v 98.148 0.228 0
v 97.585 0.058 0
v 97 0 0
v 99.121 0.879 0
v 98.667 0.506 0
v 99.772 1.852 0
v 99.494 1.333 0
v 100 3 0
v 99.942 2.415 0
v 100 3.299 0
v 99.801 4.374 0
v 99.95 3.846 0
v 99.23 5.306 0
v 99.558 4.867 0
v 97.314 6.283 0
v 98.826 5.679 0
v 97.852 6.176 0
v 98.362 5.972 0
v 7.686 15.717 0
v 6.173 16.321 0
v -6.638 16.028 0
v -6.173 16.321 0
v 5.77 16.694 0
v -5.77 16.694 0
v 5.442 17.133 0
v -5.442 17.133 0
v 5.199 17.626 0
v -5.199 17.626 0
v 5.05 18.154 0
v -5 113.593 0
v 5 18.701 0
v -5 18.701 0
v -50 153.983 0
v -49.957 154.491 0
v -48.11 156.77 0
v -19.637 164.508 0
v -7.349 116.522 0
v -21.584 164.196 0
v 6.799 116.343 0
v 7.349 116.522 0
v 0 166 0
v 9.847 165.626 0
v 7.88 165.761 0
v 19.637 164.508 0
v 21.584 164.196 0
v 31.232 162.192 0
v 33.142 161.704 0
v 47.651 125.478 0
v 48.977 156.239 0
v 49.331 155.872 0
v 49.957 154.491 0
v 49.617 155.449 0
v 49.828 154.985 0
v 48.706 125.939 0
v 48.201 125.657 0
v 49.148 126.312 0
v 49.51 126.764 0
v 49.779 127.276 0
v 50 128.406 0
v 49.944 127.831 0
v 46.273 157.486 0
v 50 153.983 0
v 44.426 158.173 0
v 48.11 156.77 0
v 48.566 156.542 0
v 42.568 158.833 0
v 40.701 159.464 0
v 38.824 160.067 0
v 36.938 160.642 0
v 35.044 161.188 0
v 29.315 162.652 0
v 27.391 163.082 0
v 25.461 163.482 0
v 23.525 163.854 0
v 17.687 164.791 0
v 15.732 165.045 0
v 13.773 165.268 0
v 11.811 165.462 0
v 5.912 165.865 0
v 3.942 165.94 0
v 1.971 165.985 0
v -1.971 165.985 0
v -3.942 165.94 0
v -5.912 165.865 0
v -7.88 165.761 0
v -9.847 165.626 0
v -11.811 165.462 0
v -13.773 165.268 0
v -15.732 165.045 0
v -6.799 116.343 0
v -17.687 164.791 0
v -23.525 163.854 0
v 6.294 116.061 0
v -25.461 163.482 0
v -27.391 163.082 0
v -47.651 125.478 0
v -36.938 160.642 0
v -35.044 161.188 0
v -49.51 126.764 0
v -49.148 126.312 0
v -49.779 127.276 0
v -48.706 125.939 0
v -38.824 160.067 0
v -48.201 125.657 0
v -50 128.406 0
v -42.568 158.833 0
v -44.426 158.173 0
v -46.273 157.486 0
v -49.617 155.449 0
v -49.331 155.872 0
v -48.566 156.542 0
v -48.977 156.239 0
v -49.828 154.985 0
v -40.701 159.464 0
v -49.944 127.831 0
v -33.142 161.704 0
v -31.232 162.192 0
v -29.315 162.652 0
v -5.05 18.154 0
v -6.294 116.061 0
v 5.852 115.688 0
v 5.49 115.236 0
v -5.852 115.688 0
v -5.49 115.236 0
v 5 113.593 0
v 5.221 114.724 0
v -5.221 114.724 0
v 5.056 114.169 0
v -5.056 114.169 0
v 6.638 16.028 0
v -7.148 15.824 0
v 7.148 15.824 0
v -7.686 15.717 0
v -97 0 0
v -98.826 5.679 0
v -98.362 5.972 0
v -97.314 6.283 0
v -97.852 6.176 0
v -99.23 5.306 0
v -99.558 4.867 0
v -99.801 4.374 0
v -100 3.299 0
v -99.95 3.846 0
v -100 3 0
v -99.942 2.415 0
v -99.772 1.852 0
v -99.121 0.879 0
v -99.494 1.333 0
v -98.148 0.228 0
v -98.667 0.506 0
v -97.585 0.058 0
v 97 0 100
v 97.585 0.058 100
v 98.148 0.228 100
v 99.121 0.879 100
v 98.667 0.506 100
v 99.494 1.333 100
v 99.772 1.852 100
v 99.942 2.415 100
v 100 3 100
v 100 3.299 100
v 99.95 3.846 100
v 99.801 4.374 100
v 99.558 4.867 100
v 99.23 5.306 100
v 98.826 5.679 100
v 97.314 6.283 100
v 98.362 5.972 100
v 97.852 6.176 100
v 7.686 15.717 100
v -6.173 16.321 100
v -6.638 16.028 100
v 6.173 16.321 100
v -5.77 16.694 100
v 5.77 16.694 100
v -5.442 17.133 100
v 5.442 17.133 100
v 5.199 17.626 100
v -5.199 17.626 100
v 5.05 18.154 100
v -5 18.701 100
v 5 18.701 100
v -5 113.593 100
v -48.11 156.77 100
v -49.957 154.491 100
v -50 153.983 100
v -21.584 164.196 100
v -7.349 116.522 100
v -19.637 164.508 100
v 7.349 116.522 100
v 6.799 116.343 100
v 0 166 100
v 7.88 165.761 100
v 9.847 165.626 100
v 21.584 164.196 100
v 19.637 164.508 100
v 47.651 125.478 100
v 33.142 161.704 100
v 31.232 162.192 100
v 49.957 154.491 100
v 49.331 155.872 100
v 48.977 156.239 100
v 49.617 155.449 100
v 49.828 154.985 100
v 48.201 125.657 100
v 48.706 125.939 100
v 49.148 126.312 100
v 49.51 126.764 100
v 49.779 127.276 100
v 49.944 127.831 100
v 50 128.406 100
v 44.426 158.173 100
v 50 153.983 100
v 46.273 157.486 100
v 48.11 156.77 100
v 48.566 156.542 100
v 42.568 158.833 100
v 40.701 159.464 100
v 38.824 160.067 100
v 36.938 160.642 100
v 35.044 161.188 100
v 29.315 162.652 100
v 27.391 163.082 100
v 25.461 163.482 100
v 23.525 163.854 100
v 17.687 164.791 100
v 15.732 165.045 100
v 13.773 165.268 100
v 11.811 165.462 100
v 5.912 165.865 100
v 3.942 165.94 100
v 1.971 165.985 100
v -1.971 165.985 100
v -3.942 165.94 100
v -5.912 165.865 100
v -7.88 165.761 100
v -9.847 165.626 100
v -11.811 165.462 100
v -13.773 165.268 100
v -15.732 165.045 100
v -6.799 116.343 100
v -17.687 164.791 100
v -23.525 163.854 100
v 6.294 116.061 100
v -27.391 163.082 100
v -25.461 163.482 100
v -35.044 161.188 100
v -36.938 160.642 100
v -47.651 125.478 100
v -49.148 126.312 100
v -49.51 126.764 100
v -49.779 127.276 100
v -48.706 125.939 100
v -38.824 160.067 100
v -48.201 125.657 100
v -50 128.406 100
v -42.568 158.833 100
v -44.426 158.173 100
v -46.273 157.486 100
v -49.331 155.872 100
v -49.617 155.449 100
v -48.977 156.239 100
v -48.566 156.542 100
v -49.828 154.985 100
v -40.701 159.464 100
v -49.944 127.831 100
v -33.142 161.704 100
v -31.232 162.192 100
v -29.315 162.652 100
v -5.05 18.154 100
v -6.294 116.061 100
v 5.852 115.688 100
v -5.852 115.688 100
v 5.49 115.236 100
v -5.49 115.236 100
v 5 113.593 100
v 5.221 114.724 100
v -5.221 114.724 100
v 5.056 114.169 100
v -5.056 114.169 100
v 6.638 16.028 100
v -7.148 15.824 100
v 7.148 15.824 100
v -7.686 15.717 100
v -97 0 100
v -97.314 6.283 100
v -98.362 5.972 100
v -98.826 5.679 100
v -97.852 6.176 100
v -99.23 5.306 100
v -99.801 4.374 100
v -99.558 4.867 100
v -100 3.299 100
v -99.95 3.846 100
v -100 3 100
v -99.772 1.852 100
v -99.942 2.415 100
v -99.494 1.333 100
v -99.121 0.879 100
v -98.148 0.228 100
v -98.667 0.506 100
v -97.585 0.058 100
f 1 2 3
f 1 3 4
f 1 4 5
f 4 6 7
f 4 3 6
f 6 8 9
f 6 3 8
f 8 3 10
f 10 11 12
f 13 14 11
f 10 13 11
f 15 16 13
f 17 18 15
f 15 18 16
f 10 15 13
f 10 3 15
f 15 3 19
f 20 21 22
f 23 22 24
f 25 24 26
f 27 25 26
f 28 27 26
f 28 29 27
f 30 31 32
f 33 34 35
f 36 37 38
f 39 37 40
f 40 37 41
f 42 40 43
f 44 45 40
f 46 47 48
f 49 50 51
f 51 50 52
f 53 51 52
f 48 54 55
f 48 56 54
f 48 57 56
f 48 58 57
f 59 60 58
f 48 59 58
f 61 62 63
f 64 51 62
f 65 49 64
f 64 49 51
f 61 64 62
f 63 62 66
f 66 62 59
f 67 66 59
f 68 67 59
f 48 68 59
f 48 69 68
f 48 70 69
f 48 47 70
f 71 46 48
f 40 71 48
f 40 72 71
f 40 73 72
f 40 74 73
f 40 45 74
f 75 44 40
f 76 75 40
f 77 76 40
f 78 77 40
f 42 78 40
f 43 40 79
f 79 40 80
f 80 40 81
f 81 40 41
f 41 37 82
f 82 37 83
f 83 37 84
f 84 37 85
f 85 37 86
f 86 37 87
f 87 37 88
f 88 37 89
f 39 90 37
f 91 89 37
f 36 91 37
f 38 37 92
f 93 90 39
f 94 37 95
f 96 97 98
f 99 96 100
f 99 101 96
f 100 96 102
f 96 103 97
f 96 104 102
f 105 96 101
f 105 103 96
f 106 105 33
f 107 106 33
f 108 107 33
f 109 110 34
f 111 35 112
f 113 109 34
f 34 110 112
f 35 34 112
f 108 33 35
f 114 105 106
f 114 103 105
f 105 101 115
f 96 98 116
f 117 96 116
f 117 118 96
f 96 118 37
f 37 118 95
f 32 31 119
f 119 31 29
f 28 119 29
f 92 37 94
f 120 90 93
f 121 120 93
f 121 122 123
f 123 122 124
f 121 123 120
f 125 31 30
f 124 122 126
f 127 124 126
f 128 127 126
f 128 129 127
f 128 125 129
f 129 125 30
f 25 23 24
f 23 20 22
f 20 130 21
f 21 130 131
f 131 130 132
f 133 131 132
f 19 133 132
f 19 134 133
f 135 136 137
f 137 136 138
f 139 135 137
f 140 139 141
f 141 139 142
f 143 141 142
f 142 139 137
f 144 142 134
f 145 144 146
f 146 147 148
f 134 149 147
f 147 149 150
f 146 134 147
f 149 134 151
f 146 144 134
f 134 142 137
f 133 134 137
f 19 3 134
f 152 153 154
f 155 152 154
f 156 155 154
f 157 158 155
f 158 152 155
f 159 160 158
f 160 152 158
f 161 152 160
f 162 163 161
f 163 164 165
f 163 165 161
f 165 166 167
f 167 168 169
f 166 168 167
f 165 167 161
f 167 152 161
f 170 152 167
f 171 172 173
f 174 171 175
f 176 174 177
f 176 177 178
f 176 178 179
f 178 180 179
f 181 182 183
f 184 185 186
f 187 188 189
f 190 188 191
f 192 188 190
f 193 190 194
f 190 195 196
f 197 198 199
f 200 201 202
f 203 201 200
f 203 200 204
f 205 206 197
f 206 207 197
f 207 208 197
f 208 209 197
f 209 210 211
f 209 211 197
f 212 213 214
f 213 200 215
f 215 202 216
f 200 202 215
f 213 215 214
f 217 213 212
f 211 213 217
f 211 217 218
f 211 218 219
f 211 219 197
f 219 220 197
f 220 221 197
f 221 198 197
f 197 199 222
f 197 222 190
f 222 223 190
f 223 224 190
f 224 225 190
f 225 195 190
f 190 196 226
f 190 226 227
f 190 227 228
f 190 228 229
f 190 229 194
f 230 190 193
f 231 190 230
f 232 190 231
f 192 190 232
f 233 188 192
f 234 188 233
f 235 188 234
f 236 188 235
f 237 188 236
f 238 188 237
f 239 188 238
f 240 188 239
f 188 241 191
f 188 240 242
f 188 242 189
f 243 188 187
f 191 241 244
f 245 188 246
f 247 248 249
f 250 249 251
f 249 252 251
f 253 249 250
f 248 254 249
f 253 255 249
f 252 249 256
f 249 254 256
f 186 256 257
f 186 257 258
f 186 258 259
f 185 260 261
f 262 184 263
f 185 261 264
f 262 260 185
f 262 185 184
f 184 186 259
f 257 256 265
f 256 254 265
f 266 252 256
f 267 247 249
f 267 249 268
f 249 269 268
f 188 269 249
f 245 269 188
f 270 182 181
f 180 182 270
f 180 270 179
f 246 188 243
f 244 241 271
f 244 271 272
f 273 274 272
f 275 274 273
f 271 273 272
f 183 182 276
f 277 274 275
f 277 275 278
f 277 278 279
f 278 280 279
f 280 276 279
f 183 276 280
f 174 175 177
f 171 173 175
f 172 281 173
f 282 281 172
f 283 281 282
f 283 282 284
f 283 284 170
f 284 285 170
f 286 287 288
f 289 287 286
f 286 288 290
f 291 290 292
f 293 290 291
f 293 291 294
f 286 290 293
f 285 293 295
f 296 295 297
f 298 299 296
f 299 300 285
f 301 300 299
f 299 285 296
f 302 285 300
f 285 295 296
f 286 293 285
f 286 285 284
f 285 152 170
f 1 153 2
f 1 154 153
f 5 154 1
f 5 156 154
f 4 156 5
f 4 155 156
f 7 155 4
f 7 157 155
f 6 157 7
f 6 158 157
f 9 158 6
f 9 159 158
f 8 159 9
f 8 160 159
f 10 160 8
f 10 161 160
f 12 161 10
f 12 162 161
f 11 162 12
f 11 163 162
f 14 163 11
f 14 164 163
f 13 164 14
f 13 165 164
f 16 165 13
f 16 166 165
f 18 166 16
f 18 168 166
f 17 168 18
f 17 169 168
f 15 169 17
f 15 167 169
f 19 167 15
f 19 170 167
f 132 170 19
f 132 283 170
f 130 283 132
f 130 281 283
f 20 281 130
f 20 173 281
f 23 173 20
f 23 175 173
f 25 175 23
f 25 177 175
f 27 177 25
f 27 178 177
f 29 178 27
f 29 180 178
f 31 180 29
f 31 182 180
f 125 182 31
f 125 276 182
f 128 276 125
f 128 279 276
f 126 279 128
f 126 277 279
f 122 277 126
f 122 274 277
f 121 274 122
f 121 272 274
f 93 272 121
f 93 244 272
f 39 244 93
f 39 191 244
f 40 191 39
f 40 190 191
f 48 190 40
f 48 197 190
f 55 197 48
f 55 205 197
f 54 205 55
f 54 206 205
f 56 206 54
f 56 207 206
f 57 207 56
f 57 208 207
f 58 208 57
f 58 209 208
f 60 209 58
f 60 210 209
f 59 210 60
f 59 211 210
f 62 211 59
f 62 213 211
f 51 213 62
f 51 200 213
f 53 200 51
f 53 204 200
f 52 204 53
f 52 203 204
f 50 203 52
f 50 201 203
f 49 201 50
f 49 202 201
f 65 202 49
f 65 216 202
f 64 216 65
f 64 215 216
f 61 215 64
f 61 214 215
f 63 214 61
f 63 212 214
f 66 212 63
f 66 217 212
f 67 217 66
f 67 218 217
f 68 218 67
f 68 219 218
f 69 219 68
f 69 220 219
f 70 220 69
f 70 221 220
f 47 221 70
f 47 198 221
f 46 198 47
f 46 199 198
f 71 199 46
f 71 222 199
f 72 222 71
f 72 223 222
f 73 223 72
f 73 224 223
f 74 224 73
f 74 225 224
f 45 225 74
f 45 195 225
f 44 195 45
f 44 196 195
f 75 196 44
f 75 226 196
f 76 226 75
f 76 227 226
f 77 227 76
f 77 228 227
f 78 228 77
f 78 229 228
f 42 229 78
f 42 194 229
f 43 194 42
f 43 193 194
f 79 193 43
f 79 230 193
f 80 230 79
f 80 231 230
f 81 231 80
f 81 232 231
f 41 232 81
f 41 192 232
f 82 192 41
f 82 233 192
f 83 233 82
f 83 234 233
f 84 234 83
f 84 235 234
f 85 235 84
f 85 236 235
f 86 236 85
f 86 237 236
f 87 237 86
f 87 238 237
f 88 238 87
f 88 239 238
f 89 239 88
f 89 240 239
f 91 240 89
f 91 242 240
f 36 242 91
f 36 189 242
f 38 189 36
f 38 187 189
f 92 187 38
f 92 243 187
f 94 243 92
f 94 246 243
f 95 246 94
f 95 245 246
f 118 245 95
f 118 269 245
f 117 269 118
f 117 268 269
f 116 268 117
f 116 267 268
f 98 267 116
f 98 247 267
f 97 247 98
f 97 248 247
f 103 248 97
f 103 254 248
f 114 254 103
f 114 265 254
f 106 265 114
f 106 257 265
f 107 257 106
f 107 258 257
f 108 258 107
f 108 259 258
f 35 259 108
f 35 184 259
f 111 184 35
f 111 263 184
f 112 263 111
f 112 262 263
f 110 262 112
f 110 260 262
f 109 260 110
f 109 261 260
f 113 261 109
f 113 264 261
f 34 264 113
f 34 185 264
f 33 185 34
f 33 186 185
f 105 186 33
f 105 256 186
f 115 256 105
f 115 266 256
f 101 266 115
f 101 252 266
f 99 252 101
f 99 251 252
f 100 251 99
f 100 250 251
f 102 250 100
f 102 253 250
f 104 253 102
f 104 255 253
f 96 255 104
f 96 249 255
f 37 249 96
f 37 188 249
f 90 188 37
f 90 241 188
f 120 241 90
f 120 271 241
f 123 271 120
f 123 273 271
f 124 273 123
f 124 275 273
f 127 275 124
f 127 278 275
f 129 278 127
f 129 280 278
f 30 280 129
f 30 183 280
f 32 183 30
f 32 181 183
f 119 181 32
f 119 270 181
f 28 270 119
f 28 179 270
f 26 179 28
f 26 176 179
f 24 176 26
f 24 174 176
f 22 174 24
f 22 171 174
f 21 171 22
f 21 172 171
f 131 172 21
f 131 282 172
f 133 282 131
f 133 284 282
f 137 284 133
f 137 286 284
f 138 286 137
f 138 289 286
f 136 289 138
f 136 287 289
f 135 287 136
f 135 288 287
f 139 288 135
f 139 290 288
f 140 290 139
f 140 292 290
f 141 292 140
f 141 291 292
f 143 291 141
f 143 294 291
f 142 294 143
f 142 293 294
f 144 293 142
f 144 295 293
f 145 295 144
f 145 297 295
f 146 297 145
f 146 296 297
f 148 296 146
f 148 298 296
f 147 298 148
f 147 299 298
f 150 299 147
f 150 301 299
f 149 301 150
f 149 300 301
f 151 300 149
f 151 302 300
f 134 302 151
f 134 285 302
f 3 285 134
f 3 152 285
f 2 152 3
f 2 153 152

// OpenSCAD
// Generated by Parametrix
ca_rail_faceRail_000 = [ [ 100.0000, 3.0000 ],[ 100.0000, 3.2992 ],[ 99.9498, 3.8459 ],[ 99.8008, 4.3742 ],[ 99.5580, 4.8666 ],[ 99.2296, 5.3064 ],[ 98.8265, 5.6791 ],[ 98.3623, 5.9721 ],[ 97.8524, 6.1756 ],[ 97.3141, 6.2827 ],[ 7.6859, 15.7173 ],[ 7.1476, 15.8244 ],[ 6.6377, 16.0279 ],[ 6.1735, 16.3209 ],[ 5.7704, 16.6936 ],[ 5.4420, 17.1334 ],[ 5.1992, 17.6258 ],[ 5.0502, 18.1541 ],[ 5.0000, 18.7008 ],[ 5.0000, 113.5935 ],[ 5.0558, 114.1694 ],[ 5.2211, 114.7238 ],[ 5.4898, 115.2363 ],[ 5.8518, 115.6876 ],[ 6.2937, 116.0610 ],[ 6.7991, 116.3427 ],[ 7.3492, 116.5220 ],[ 47.6508, 125.4780 ],[ 48.2009, 125.6573 ],[ 48.7063, 125.9390 ],[ 49.1482, 126.3124 ],[ 49.5102, 126.7637 ],[ 49.7789, 127.2762 ],[ 49.9442, 127.8306 ],[ 50.0000, 128.4065 ],[ 50.0000, 153.9830 ],[ 49.9566, 154.4913 ],[ 49.8278, 154.9849 ],[ 49.6172, 155.4495 ],[ 49.3309, 155.8717 ],[ 48.9772, 156.2393 ],[ 48.5664, 156.5417 ],[ 48.1102, 156.7701 ],[ 46.2734, 157.4857 ],[ 44.4260, 158.1734 ],[ 42.5684, 158.8329 ],[ 40.7009, 159.4643 ],[ 38.8242, 160.0673 ],[ 36.9384, 160.6417 ],[ 35.0442, 161.1875 ],[ 33.1420, 161.7045 ],[ 31.2321, 162.1925 ],[ 29.3150, 162.6516 ],[ 27.3912, 163.0816 ],[ 25.4611, 163.4823 ],[ 23.5251, 163.8537 ],[ 21.5838, 164.1957 ],[ 19.6374, 164.5083 ],[ 17.6866, 164.7912 ],[ 15.7316, 165.0446 ],[ 13.7731, 165.2683 ],[ 11.8114, 165.4623 ],[ 9.8470, 165.6265 ],[ 7.8803, 165.7609 ],[ 5.9118, 165.8655 ],[ 3.9420, 165.9402 ],[ 1.9712, 165.9851 ],[ -0.0000, 166.0000 ],[ -1.9712, 165.9851 ],[ -3.9420, 165.9402 ],[ -5.9118, 165.8655 ],[ -7.8803, 165.7609 ],[ -9.8470, 165.6265 ],[ -11.8114, 165.4623 ],[ -13.7731, 165.2683 ],[ -15.7316, 165.0446 ],[ -17.6866, 164.7912 ],[ -19.6374, 164.5083 ],[ -21.5838, 164.1957 ],[ -23.5251, 163.8537 ],[ -25.4611, 163.4823 ],[ -27.3912, 163.0816 ],[ -29.3150, 162.6516 ],[ -31.2321, 162.1925 ],[ -33.1420, 161.7045 ],[ -35.0442, 161.1875 ],[ -36.9384, 160.6417 ],[ -38.8242, 160.0673 ],[ -40.7009, 159.4643 ],[ -42.5684, 158.8329 ],[ -44.4260, 158.1734 ],[ -46.2734, 157.4857 ],[ -48.1102, 156.7701 ],[ -48.5664, 156.5417 ],[ -48.9772, 156.2393 ],[ -49.3309, 155.8717 ],[ -49.6172, 155.4495 ],[ -49.8278, 154.9849 ],[ -49.9566, 154.4913 ],[ -50.0000, 153.9830 ],[ -50.0000, 128.4065 ],[ -49.9442, 127.8306 ],[ -49.7789, 127.2762 ],[ -49.5102, 126.7637 ],[ -49.1482, 126.3124 ],[ -48.7063, 125.9390 ],[ -48.2009, 125.6573 ],[ -47.6508, 125.4780 ],[ -7.3492, 116.5220 ],[ -6.7991, 116.3427 ],[ -6.2937, 116.0610 ],[ -5.8518, 115.6876 ],[ -5.4898, 115.2363 ],[ -5.2211, 114.7238 ],[ -5.0558, 114.1694 ],[ -5.0000, 113.5935 ],[ -5.0000, 18.7008 ],[ -5.0502, 18.1541 ],[ -5.1992, 17.6258 ],[ -5.4420, 17.1334 ],[ -5.7704, 16.6936 ],[ -6.1735, 16.3209 ],[ -6.6377, 16.0279 ],[ -7.1476, 15.8244 ],[ -7.6859, 15.7173 ],[ -97.3141, 6.2827 ],[ -97.8524, 6.1756 ],[ -98.3623, 5.9721 ],[ -98.8265, 5.6791 ],[ -99.2296, 5.3064 ],[ -99.5580, 4.8666 ],[ -99.8008, 4.3742 ],[ -99.9498, 3.8459 ],[ -100.0000, 3.2992 ],[ -100.0000, 3.0000 ],[ -99.9424, 2.4147 ],[ -99.7716, 1.8519 ],[ -99.4944, 1.3333 ],[ -99.1213, 0.8787 ],[ -98.6667, 0.5056 ],[ -98.1481, 0.2284 ],[ -97.5853, 0.0576 ],[ -97.0000, 0.0000 ],[ 97.0000, 0.0000 ],[ 97.5853, 0.0576 ],[ 98.1481, 0.2284 ],[ 98.6667, 0.5056 ],[ 99.1213, 0.8787 ],[ 99.4944, 1.3333 ],[ 99.7716, 1.8519 ],[ 99.9424, 2.4147 ],[ 100.0000, 3.0000 ] ];
cb_rail_faceRail_000 = [  0, 1, 2, 3, 4, 5, 6, 7, 8, 9, 10, 11, 12, 13, 14, 15, 16, 17, 18, 19, 20, 21, 22, 23, 24, 25, 26, 27, 28, 29, 30, 31, 32, 33, 34, 35, 36, 37, 38, 39, 40, 41, 42, 43, 44, 45, 46, 47, 48, 49, 50, 51, 52, 53, 54, 55, 56, 57, 58, 59, 60, 61, 62, 63, 64, 65, 66, 67, 68, 69, 70, 71, 72, 73, 74, 75, 76, 77, 78, 79, 80, 81, 82, 83, 84, 85, 86, 87, 88, 89, 90, 91, 92, 93, 94, 95, 96, 97, 98, 99, 100, 101, 102, 103, 104, 105, 106, 107, 108, 109, 110, 111, 112, 113, 114, 115, 116, 117, 118, 119, 120, 121, 122, 123, 124, 125, 126, 127, 128, 129, 130, 131, 132, 133, 134, 135, 136, 137, 138, 139, 140, 141, 142, 143, 144, 145, 146, 147, 148, 149, 150, 151 ];
a_rail_faceRail = concat(ca_rail_faceRail_000);
b_rail_faceRail = [cb_rail_faceRail_000];

module subpax_rail () {
	translate( [ 0, 0, 0 ])
		rotate( [ 0, 0, 0 ])
			   linear_extrude(height = 100) polygon(a_rail_faceRail, b_rail_faceRail);
}

module pax_rail () {
	subpax_rail();
}

pax_rail();
